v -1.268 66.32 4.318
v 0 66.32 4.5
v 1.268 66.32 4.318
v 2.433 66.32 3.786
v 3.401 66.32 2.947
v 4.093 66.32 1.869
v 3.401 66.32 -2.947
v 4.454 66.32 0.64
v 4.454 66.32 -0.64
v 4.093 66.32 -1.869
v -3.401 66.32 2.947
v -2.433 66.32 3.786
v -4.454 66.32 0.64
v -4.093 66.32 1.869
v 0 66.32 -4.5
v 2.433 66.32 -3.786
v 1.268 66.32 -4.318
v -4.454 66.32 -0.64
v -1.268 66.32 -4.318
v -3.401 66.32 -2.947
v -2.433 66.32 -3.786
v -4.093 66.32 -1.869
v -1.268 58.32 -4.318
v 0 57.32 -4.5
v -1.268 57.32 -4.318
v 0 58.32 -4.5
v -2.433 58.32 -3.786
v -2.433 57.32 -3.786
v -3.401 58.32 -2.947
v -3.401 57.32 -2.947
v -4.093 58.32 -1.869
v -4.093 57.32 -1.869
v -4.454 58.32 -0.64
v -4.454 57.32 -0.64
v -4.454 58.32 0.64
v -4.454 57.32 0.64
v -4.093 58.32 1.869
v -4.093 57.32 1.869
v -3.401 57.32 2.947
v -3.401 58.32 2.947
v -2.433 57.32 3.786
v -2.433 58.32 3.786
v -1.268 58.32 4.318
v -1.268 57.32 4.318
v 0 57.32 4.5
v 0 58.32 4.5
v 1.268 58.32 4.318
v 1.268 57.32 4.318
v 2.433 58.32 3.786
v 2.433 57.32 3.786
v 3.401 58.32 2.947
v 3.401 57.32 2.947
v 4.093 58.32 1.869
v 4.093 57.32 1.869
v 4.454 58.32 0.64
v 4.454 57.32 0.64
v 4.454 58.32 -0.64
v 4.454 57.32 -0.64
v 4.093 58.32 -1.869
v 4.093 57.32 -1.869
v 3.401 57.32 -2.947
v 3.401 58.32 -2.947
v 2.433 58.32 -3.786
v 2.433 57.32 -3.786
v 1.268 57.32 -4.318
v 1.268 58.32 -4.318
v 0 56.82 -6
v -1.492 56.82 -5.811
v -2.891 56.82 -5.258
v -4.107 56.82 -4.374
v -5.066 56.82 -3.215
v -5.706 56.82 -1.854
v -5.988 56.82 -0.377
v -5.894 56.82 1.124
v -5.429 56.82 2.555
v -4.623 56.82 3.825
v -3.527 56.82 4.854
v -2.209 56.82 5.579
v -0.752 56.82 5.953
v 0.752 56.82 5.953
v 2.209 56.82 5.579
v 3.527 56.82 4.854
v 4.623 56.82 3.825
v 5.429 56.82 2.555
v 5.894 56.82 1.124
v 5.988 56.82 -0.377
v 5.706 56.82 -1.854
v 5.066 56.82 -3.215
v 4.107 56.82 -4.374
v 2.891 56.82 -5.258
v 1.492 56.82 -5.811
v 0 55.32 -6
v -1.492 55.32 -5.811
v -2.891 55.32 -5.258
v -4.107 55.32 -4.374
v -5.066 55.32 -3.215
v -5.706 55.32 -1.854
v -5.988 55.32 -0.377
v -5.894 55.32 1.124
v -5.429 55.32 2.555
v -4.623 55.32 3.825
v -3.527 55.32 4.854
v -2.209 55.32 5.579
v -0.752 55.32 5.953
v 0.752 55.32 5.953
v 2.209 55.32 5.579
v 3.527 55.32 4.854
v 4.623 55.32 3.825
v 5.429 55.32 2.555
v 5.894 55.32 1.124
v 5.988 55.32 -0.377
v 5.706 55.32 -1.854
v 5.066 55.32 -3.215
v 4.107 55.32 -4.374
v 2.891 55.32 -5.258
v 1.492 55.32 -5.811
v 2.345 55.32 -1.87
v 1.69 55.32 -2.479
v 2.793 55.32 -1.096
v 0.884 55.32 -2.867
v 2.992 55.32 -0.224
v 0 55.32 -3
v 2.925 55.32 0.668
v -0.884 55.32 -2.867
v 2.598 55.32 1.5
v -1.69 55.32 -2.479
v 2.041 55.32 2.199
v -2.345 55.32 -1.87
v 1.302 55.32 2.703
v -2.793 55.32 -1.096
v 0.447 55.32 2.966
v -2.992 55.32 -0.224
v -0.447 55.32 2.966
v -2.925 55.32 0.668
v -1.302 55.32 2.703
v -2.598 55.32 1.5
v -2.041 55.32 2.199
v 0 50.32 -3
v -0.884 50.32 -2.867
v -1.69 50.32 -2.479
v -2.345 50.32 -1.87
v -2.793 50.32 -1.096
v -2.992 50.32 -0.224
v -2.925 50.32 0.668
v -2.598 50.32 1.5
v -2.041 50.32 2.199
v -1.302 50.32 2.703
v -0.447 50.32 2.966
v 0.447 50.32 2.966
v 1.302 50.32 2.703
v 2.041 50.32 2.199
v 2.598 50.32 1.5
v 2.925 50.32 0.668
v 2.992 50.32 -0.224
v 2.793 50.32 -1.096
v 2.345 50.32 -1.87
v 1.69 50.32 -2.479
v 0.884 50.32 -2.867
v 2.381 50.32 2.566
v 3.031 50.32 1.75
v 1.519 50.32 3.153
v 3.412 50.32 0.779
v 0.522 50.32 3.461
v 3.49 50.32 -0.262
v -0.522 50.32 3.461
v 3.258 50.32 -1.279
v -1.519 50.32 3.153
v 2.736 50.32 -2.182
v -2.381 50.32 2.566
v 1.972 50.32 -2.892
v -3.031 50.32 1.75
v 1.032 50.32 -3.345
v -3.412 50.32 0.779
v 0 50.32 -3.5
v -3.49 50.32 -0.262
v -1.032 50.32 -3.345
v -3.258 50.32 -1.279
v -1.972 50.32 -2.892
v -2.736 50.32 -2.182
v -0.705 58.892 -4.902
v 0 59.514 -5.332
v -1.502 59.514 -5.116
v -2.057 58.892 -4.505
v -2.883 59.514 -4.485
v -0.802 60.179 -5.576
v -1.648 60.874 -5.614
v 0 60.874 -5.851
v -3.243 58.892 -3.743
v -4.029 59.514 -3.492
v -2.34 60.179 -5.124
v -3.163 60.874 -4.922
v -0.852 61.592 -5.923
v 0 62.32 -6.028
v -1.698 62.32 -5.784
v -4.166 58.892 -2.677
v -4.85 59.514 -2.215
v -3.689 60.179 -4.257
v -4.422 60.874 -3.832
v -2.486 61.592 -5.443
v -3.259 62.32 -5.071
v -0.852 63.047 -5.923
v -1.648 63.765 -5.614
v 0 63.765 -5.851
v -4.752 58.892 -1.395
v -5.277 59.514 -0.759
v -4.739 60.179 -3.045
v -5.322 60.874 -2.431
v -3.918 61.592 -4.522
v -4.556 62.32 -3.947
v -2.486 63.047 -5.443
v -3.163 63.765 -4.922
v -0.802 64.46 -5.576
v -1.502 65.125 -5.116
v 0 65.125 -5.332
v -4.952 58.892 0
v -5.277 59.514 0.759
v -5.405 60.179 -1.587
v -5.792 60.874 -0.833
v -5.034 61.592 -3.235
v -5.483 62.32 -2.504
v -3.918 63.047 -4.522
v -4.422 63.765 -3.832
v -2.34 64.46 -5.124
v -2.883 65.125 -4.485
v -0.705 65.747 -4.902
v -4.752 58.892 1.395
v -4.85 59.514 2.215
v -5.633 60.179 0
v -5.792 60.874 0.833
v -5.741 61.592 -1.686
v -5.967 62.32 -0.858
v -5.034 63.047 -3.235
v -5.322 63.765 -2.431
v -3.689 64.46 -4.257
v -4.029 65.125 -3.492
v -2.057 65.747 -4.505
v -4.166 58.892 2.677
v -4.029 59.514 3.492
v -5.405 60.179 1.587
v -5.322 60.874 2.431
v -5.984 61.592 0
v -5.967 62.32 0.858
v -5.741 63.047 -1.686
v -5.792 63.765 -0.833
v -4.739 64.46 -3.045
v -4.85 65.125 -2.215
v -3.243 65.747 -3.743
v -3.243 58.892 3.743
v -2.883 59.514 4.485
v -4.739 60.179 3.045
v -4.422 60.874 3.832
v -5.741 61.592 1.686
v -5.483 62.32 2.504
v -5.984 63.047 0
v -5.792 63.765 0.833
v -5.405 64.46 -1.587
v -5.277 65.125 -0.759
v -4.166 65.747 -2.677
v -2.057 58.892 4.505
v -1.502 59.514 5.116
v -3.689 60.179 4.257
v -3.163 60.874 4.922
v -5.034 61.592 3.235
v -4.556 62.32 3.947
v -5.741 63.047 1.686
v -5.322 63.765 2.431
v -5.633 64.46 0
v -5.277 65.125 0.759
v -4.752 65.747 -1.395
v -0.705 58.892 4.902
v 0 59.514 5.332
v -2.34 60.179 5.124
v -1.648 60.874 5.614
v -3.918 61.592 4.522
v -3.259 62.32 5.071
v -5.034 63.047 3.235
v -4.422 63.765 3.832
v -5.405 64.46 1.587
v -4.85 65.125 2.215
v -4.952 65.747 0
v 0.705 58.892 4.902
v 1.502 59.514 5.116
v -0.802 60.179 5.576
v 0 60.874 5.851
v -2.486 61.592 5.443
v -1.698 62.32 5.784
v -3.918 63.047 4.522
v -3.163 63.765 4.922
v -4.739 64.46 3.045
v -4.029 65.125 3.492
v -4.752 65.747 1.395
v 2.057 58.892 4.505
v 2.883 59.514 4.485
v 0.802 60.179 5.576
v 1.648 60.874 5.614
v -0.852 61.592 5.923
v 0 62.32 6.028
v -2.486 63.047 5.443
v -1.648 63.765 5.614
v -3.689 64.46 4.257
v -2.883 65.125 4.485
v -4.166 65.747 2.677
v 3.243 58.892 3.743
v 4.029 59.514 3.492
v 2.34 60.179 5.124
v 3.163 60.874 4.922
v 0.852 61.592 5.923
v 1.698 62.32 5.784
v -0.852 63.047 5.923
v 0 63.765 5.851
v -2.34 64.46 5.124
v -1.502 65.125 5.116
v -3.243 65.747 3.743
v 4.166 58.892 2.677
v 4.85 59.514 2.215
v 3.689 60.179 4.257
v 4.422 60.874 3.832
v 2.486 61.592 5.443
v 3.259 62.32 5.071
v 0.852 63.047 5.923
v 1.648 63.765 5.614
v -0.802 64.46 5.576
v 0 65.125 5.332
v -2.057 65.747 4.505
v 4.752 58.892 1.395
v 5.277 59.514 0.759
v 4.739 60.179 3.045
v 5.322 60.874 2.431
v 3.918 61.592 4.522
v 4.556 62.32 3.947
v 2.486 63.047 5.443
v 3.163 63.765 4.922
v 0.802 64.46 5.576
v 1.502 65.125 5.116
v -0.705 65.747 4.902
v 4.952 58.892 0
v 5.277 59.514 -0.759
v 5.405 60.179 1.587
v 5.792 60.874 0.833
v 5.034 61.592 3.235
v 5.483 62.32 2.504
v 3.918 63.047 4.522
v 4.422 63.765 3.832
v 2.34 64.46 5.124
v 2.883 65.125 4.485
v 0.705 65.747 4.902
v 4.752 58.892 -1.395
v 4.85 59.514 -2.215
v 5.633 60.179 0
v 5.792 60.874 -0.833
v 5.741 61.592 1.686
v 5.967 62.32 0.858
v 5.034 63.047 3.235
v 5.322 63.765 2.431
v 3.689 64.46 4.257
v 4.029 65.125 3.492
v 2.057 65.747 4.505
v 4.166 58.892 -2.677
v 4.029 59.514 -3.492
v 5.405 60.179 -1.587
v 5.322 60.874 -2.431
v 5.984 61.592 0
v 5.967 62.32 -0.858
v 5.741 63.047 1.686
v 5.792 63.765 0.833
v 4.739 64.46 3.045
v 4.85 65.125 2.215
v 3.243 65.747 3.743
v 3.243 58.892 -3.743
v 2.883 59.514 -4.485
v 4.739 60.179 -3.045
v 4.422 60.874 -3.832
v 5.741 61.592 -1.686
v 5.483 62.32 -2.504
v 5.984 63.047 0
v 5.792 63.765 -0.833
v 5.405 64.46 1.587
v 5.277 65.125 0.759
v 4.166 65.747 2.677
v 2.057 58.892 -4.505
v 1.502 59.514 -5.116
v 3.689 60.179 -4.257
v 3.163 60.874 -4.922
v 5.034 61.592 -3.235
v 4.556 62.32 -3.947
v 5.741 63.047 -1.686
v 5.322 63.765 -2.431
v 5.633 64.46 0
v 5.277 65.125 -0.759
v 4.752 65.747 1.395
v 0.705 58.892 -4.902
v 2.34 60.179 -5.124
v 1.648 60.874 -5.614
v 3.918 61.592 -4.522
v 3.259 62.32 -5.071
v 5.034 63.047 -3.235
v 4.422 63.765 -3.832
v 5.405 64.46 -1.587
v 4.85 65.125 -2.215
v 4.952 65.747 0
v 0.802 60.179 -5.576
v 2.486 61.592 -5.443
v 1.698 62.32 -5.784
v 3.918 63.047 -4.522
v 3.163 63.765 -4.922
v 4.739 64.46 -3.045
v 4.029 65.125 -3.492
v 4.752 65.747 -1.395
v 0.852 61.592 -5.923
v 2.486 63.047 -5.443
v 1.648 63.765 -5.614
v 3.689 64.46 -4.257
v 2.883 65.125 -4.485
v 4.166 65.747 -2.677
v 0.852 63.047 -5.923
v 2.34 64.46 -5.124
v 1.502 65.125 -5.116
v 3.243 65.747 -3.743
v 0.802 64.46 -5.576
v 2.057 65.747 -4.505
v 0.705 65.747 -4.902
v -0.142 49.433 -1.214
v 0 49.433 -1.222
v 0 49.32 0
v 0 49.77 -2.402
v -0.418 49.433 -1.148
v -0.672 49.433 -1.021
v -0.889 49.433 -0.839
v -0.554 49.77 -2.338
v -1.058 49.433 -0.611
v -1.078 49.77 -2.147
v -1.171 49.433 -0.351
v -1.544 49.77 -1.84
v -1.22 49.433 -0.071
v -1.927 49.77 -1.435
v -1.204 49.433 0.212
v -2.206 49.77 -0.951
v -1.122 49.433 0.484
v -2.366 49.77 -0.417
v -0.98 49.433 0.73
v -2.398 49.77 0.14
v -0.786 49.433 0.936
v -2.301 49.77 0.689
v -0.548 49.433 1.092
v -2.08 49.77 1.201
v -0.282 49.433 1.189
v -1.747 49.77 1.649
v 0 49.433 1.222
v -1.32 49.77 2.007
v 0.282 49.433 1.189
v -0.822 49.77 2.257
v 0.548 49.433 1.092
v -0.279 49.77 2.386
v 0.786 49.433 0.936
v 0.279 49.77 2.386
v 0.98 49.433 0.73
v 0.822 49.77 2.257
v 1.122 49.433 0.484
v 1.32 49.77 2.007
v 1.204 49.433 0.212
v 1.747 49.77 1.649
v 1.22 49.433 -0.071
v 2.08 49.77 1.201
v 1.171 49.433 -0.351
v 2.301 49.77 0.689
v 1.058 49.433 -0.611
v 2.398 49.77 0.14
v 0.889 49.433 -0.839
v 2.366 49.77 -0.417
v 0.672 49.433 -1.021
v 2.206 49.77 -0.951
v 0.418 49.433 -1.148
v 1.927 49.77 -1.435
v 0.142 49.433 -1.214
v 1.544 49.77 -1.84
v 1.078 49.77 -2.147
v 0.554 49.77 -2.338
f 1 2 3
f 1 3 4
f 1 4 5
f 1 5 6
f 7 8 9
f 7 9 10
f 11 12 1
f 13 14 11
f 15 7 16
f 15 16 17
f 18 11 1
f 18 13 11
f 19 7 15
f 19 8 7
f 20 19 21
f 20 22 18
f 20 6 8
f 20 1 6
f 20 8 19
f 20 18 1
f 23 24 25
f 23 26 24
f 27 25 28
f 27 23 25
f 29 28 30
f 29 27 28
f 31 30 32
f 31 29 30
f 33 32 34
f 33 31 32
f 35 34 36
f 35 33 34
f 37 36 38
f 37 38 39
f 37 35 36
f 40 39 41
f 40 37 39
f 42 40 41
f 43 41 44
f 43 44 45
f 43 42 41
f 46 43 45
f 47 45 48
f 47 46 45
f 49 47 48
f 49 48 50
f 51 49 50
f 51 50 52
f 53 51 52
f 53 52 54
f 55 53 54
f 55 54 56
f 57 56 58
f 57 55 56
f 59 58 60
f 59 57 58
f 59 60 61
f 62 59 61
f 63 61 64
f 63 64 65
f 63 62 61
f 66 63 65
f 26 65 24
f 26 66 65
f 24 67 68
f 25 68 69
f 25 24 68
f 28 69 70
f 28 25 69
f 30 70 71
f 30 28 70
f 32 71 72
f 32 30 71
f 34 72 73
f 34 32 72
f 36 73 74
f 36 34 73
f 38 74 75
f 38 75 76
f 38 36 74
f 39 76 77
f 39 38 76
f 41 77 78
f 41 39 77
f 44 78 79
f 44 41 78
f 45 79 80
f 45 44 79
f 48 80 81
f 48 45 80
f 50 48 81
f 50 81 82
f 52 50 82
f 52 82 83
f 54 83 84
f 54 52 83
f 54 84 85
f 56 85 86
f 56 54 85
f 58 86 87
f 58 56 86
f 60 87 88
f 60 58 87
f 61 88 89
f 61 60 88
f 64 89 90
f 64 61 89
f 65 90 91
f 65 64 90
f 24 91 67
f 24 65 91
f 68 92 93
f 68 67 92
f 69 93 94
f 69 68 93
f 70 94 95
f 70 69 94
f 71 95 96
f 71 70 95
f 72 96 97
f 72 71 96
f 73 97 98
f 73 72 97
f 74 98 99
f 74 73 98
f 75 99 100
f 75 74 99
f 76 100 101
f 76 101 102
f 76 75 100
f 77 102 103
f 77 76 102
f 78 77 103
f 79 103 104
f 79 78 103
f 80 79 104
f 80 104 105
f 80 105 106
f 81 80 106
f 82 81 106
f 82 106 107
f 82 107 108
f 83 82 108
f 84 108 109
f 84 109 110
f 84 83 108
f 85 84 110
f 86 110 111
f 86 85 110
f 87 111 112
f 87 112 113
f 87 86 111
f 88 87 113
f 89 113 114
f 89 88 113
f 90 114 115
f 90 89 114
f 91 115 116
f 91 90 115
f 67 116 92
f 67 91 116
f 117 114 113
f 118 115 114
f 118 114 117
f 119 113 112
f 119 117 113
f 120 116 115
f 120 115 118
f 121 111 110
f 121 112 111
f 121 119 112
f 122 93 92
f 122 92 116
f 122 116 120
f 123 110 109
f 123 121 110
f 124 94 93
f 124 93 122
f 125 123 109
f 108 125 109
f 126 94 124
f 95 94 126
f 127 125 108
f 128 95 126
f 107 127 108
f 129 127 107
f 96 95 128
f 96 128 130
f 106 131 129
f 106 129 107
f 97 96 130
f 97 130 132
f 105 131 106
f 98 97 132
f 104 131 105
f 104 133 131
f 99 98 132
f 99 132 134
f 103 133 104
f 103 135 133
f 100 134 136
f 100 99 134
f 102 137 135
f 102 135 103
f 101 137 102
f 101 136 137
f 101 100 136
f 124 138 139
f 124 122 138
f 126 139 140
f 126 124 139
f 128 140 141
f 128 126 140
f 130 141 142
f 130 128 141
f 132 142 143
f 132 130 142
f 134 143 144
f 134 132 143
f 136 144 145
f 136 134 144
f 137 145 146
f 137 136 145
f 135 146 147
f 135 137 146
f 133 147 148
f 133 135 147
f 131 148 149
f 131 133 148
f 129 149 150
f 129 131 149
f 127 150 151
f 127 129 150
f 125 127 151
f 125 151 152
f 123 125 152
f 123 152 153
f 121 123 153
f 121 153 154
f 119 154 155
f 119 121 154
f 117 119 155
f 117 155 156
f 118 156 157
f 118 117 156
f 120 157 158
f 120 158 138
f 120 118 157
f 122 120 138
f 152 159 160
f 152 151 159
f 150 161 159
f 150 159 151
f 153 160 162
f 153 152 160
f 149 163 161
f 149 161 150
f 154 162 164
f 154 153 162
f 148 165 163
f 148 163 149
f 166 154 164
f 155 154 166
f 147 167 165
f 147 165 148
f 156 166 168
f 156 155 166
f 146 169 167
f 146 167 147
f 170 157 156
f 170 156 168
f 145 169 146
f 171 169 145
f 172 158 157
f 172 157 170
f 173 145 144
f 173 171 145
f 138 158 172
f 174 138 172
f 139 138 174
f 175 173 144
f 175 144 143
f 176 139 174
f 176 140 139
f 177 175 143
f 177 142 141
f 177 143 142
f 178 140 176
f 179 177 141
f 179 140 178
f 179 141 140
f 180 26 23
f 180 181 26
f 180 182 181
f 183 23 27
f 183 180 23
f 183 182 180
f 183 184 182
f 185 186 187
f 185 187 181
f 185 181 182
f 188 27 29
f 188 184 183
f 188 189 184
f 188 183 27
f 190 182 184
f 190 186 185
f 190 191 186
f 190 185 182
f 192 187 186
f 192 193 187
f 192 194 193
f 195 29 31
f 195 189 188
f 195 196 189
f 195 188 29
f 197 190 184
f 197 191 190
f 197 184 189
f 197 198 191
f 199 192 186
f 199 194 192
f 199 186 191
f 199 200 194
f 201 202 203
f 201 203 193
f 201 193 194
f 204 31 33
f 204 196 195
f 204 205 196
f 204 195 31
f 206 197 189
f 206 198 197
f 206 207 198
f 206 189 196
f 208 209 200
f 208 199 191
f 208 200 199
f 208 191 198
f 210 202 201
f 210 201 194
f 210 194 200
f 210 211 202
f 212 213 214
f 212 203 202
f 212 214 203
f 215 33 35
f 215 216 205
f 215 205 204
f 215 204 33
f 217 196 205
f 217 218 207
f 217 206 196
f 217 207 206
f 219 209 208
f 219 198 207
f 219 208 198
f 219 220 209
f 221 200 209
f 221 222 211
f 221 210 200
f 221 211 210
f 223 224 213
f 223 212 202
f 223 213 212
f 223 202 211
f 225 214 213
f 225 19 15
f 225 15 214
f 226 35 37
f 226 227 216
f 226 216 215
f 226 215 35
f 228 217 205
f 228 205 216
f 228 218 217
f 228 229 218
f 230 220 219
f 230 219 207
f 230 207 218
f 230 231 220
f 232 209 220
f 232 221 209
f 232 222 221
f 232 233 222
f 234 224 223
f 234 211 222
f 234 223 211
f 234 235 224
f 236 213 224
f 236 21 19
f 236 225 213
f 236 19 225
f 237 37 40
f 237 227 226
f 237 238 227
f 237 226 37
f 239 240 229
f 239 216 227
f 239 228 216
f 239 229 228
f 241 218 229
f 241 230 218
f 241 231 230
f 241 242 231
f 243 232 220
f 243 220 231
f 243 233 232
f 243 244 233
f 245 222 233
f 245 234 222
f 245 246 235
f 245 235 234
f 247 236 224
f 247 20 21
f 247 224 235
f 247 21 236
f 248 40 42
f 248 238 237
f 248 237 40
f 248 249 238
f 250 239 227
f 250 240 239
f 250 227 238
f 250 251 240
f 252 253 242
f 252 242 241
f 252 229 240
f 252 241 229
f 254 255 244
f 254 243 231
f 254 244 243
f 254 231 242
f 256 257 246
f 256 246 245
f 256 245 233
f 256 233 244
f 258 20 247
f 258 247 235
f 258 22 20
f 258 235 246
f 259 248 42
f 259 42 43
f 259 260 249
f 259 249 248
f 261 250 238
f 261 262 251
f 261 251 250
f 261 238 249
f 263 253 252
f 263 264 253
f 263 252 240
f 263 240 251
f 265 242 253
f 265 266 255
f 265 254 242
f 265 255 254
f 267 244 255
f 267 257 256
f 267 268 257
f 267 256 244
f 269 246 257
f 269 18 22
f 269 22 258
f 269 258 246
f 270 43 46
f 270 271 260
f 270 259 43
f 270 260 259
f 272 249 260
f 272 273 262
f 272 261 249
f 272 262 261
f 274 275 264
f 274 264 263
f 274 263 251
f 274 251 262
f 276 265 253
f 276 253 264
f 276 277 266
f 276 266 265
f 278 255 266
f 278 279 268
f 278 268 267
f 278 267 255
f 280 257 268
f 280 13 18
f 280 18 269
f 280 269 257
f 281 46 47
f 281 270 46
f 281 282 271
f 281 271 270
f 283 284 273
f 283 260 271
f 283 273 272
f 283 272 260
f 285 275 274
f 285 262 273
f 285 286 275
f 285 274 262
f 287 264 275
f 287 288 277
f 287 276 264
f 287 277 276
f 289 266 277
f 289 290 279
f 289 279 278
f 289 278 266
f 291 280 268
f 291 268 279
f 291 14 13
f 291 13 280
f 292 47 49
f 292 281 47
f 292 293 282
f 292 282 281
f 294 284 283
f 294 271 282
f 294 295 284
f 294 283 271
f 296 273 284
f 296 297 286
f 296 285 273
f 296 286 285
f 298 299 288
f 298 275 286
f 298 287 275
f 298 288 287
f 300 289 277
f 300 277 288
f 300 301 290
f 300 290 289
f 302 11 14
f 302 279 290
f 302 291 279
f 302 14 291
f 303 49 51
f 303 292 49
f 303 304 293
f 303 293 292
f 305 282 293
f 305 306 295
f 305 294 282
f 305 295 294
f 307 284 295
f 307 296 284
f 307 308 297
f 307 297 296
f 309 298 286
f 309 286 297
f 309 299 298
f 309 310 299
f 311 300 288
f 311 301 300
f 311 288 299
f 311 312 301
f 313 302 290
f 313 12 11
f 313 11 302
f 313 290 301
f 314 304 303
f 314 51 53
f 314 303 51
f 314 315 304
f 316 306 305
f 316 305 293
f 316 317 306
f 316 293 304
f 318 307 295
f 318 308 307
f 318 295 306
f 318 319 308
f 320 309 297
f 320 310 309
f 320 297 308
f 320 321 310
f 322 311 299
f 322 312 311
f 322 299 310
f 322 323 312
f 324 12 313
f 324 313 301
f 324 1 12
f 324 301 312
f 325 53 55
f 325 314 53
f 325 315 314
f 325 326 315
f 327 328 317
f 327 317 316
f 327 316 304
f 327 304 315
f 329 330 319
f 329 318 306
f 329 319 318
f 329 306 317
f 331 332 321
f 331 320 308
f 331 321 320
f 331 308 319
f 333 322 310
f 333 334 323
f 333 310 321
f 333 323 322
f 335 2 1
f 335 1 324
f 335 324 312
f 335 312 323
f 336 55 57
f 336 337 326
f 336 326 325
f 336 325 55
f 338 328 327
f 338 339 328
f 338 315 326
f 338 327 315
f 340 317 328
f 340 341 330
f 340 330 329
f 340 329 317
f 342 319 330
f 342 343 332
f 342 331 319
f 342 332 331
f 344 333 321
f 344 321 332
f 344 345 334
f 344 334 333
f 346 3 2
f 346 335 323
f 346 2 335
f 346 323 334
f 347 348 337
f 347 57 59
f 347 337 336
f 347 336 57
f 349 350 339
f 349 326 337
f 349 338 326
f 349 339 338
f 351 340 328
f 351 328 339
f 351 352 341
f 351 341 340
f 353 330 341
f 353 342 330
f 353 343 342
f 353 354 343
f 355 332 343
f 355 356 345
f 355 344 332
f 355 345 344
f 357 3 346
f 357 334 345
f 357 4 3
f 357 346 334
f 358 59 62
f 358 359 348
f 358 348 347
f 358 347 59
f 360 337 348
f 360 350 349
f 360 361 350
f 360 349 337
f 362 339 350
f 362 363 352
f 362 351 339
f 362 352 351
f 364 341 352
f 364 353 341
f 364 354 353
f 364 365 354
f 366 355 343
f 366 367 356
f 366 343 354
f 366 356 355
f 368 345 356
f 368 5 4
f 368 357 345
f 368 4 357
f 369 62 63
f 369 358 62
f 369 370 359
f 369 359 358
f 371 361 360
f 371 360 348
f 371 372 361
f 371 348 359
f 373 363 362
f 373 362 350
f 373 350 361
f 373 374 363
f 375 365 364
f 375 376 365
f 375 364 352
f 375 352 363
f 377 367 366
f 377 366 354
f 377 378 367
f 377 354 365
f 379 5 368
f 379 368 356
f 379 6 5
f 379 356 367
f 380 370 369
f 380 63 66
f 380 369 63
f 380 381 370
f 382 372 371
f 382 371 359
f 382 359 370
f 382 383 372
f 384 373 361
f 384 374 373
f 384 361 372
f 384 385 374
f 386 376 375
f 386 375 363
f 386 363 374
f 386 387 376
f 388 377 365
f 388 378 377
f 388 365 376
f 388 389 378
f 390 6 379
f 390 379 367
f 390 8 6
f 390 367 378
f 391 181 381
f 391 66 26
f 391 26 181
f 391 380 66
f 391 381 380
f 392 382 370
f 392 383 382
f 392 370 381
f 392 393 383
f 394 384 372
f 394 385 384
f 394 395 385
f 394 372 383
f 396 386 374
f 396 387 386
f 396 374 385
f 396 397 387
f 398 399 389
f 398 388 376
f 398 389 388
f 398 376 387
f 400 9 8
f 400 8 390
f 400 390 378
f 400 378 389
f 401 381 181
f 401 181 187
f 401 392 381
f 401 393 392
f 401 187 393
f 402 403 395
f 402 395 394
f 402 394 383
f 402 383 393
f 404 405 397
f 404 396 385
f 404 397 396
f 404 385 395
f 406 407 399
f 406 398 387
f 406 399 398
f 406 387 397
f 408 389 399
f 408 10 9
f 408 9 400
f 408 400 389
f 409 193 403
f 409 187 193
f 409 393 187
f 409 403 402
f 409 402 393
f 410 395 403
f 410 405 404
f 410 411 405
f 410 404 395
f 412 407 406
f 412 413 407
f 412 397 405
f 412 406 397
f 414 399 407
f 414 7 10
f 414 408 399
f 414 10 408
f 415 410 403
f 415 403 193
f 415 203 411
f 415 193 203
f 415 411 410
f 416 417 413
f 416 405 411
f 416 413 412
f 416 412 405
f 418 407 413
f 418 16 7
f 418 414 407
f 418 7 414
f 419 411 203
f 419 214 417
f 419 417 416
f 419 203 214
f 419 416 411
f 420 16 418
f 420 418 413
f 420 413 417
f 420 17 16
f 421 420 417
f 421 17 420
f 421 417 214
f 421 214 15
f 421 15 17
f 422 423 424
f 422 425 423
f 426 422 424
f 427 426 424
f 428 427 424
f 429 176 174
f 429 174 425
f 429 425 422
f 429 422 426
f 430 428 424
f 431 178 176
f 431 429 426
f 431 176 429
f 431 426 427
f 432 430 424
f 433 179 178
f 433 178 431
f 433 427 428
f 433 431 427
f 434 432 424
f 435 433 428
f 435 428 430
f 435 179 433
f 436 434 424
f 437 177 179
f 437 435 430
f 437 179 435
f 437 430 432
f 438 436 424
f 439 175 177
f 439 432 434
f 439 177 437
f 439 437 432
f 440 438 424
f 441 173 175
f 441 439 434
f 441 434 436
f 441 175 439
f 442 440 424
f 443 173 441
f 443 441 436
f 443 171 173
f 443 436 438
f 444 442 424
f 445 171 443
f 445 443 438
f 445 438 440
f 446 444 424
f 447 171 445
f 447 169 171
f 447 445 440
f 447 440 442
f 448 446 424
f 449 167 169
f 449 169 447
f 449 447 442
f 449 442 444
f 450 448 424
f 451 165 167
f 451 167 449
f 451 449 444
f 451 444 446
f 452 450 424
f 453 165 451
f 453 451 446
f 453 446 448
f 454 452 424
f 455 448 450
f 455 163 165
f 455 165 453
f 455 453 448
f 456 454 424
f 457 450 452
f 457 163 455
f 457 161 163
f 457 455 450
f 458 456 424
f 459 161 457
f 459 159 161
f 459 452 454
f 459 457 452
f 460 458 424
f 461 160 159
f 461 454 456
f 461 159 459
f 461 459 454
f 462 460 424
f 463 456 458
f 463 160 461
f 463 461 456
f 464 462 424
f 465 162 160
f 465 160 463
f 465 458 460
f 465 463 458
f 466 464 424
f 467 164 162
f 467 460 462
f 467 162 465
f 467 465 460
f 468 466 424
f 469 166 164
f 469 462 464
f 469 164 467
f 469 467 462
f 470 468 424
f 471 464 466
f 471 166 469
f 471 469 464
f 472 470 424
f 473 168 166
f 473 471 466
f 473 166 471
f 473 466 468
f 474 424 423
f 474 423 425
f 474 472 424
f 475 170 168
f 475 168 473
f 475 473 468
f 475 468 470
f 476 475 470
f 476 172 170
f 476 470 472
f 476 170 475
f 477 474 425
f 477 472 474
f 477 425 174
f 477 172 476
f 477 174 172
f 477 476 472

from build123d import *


with BuildPart() as part:
    # Esquisse1 → Révolution1 (revolve)
    with BuildSketch(Plane.XY):
        with BuildLine():
            Line((-4.5, 66.319551268), (0, 66.319551268))
            Line((0, 66.319551268), (0, 49.319551268))
            ThreePointArc((0, 49.319551268), (-1.820027472, 49.574455115), (-3.5, 50.319551268))
            Line((-3.5, 50.319551268), (-3, 50.319551268))
            Line((-3, 50.319551268), (-3, 55.319551268))
            Line((-3, 55.319551268), (-6, 55.319551268))
            Line((-6, 55.319551268), (-6, 56.819551268))
            Line((-6, 56.819551268), (-4.5, 57.319551268))
            Line((-4.5, 57.319551268), (-4.5, 58.319551268))
            ThreePointArc((-4.5, 58.319551268), (-6.027864045, 62.319551268), (-4.5, 66.319551268))
        make_face()
    revolve(axis=Axis((0, 0, 0), (0, 1, 0)))


solid = part.part
